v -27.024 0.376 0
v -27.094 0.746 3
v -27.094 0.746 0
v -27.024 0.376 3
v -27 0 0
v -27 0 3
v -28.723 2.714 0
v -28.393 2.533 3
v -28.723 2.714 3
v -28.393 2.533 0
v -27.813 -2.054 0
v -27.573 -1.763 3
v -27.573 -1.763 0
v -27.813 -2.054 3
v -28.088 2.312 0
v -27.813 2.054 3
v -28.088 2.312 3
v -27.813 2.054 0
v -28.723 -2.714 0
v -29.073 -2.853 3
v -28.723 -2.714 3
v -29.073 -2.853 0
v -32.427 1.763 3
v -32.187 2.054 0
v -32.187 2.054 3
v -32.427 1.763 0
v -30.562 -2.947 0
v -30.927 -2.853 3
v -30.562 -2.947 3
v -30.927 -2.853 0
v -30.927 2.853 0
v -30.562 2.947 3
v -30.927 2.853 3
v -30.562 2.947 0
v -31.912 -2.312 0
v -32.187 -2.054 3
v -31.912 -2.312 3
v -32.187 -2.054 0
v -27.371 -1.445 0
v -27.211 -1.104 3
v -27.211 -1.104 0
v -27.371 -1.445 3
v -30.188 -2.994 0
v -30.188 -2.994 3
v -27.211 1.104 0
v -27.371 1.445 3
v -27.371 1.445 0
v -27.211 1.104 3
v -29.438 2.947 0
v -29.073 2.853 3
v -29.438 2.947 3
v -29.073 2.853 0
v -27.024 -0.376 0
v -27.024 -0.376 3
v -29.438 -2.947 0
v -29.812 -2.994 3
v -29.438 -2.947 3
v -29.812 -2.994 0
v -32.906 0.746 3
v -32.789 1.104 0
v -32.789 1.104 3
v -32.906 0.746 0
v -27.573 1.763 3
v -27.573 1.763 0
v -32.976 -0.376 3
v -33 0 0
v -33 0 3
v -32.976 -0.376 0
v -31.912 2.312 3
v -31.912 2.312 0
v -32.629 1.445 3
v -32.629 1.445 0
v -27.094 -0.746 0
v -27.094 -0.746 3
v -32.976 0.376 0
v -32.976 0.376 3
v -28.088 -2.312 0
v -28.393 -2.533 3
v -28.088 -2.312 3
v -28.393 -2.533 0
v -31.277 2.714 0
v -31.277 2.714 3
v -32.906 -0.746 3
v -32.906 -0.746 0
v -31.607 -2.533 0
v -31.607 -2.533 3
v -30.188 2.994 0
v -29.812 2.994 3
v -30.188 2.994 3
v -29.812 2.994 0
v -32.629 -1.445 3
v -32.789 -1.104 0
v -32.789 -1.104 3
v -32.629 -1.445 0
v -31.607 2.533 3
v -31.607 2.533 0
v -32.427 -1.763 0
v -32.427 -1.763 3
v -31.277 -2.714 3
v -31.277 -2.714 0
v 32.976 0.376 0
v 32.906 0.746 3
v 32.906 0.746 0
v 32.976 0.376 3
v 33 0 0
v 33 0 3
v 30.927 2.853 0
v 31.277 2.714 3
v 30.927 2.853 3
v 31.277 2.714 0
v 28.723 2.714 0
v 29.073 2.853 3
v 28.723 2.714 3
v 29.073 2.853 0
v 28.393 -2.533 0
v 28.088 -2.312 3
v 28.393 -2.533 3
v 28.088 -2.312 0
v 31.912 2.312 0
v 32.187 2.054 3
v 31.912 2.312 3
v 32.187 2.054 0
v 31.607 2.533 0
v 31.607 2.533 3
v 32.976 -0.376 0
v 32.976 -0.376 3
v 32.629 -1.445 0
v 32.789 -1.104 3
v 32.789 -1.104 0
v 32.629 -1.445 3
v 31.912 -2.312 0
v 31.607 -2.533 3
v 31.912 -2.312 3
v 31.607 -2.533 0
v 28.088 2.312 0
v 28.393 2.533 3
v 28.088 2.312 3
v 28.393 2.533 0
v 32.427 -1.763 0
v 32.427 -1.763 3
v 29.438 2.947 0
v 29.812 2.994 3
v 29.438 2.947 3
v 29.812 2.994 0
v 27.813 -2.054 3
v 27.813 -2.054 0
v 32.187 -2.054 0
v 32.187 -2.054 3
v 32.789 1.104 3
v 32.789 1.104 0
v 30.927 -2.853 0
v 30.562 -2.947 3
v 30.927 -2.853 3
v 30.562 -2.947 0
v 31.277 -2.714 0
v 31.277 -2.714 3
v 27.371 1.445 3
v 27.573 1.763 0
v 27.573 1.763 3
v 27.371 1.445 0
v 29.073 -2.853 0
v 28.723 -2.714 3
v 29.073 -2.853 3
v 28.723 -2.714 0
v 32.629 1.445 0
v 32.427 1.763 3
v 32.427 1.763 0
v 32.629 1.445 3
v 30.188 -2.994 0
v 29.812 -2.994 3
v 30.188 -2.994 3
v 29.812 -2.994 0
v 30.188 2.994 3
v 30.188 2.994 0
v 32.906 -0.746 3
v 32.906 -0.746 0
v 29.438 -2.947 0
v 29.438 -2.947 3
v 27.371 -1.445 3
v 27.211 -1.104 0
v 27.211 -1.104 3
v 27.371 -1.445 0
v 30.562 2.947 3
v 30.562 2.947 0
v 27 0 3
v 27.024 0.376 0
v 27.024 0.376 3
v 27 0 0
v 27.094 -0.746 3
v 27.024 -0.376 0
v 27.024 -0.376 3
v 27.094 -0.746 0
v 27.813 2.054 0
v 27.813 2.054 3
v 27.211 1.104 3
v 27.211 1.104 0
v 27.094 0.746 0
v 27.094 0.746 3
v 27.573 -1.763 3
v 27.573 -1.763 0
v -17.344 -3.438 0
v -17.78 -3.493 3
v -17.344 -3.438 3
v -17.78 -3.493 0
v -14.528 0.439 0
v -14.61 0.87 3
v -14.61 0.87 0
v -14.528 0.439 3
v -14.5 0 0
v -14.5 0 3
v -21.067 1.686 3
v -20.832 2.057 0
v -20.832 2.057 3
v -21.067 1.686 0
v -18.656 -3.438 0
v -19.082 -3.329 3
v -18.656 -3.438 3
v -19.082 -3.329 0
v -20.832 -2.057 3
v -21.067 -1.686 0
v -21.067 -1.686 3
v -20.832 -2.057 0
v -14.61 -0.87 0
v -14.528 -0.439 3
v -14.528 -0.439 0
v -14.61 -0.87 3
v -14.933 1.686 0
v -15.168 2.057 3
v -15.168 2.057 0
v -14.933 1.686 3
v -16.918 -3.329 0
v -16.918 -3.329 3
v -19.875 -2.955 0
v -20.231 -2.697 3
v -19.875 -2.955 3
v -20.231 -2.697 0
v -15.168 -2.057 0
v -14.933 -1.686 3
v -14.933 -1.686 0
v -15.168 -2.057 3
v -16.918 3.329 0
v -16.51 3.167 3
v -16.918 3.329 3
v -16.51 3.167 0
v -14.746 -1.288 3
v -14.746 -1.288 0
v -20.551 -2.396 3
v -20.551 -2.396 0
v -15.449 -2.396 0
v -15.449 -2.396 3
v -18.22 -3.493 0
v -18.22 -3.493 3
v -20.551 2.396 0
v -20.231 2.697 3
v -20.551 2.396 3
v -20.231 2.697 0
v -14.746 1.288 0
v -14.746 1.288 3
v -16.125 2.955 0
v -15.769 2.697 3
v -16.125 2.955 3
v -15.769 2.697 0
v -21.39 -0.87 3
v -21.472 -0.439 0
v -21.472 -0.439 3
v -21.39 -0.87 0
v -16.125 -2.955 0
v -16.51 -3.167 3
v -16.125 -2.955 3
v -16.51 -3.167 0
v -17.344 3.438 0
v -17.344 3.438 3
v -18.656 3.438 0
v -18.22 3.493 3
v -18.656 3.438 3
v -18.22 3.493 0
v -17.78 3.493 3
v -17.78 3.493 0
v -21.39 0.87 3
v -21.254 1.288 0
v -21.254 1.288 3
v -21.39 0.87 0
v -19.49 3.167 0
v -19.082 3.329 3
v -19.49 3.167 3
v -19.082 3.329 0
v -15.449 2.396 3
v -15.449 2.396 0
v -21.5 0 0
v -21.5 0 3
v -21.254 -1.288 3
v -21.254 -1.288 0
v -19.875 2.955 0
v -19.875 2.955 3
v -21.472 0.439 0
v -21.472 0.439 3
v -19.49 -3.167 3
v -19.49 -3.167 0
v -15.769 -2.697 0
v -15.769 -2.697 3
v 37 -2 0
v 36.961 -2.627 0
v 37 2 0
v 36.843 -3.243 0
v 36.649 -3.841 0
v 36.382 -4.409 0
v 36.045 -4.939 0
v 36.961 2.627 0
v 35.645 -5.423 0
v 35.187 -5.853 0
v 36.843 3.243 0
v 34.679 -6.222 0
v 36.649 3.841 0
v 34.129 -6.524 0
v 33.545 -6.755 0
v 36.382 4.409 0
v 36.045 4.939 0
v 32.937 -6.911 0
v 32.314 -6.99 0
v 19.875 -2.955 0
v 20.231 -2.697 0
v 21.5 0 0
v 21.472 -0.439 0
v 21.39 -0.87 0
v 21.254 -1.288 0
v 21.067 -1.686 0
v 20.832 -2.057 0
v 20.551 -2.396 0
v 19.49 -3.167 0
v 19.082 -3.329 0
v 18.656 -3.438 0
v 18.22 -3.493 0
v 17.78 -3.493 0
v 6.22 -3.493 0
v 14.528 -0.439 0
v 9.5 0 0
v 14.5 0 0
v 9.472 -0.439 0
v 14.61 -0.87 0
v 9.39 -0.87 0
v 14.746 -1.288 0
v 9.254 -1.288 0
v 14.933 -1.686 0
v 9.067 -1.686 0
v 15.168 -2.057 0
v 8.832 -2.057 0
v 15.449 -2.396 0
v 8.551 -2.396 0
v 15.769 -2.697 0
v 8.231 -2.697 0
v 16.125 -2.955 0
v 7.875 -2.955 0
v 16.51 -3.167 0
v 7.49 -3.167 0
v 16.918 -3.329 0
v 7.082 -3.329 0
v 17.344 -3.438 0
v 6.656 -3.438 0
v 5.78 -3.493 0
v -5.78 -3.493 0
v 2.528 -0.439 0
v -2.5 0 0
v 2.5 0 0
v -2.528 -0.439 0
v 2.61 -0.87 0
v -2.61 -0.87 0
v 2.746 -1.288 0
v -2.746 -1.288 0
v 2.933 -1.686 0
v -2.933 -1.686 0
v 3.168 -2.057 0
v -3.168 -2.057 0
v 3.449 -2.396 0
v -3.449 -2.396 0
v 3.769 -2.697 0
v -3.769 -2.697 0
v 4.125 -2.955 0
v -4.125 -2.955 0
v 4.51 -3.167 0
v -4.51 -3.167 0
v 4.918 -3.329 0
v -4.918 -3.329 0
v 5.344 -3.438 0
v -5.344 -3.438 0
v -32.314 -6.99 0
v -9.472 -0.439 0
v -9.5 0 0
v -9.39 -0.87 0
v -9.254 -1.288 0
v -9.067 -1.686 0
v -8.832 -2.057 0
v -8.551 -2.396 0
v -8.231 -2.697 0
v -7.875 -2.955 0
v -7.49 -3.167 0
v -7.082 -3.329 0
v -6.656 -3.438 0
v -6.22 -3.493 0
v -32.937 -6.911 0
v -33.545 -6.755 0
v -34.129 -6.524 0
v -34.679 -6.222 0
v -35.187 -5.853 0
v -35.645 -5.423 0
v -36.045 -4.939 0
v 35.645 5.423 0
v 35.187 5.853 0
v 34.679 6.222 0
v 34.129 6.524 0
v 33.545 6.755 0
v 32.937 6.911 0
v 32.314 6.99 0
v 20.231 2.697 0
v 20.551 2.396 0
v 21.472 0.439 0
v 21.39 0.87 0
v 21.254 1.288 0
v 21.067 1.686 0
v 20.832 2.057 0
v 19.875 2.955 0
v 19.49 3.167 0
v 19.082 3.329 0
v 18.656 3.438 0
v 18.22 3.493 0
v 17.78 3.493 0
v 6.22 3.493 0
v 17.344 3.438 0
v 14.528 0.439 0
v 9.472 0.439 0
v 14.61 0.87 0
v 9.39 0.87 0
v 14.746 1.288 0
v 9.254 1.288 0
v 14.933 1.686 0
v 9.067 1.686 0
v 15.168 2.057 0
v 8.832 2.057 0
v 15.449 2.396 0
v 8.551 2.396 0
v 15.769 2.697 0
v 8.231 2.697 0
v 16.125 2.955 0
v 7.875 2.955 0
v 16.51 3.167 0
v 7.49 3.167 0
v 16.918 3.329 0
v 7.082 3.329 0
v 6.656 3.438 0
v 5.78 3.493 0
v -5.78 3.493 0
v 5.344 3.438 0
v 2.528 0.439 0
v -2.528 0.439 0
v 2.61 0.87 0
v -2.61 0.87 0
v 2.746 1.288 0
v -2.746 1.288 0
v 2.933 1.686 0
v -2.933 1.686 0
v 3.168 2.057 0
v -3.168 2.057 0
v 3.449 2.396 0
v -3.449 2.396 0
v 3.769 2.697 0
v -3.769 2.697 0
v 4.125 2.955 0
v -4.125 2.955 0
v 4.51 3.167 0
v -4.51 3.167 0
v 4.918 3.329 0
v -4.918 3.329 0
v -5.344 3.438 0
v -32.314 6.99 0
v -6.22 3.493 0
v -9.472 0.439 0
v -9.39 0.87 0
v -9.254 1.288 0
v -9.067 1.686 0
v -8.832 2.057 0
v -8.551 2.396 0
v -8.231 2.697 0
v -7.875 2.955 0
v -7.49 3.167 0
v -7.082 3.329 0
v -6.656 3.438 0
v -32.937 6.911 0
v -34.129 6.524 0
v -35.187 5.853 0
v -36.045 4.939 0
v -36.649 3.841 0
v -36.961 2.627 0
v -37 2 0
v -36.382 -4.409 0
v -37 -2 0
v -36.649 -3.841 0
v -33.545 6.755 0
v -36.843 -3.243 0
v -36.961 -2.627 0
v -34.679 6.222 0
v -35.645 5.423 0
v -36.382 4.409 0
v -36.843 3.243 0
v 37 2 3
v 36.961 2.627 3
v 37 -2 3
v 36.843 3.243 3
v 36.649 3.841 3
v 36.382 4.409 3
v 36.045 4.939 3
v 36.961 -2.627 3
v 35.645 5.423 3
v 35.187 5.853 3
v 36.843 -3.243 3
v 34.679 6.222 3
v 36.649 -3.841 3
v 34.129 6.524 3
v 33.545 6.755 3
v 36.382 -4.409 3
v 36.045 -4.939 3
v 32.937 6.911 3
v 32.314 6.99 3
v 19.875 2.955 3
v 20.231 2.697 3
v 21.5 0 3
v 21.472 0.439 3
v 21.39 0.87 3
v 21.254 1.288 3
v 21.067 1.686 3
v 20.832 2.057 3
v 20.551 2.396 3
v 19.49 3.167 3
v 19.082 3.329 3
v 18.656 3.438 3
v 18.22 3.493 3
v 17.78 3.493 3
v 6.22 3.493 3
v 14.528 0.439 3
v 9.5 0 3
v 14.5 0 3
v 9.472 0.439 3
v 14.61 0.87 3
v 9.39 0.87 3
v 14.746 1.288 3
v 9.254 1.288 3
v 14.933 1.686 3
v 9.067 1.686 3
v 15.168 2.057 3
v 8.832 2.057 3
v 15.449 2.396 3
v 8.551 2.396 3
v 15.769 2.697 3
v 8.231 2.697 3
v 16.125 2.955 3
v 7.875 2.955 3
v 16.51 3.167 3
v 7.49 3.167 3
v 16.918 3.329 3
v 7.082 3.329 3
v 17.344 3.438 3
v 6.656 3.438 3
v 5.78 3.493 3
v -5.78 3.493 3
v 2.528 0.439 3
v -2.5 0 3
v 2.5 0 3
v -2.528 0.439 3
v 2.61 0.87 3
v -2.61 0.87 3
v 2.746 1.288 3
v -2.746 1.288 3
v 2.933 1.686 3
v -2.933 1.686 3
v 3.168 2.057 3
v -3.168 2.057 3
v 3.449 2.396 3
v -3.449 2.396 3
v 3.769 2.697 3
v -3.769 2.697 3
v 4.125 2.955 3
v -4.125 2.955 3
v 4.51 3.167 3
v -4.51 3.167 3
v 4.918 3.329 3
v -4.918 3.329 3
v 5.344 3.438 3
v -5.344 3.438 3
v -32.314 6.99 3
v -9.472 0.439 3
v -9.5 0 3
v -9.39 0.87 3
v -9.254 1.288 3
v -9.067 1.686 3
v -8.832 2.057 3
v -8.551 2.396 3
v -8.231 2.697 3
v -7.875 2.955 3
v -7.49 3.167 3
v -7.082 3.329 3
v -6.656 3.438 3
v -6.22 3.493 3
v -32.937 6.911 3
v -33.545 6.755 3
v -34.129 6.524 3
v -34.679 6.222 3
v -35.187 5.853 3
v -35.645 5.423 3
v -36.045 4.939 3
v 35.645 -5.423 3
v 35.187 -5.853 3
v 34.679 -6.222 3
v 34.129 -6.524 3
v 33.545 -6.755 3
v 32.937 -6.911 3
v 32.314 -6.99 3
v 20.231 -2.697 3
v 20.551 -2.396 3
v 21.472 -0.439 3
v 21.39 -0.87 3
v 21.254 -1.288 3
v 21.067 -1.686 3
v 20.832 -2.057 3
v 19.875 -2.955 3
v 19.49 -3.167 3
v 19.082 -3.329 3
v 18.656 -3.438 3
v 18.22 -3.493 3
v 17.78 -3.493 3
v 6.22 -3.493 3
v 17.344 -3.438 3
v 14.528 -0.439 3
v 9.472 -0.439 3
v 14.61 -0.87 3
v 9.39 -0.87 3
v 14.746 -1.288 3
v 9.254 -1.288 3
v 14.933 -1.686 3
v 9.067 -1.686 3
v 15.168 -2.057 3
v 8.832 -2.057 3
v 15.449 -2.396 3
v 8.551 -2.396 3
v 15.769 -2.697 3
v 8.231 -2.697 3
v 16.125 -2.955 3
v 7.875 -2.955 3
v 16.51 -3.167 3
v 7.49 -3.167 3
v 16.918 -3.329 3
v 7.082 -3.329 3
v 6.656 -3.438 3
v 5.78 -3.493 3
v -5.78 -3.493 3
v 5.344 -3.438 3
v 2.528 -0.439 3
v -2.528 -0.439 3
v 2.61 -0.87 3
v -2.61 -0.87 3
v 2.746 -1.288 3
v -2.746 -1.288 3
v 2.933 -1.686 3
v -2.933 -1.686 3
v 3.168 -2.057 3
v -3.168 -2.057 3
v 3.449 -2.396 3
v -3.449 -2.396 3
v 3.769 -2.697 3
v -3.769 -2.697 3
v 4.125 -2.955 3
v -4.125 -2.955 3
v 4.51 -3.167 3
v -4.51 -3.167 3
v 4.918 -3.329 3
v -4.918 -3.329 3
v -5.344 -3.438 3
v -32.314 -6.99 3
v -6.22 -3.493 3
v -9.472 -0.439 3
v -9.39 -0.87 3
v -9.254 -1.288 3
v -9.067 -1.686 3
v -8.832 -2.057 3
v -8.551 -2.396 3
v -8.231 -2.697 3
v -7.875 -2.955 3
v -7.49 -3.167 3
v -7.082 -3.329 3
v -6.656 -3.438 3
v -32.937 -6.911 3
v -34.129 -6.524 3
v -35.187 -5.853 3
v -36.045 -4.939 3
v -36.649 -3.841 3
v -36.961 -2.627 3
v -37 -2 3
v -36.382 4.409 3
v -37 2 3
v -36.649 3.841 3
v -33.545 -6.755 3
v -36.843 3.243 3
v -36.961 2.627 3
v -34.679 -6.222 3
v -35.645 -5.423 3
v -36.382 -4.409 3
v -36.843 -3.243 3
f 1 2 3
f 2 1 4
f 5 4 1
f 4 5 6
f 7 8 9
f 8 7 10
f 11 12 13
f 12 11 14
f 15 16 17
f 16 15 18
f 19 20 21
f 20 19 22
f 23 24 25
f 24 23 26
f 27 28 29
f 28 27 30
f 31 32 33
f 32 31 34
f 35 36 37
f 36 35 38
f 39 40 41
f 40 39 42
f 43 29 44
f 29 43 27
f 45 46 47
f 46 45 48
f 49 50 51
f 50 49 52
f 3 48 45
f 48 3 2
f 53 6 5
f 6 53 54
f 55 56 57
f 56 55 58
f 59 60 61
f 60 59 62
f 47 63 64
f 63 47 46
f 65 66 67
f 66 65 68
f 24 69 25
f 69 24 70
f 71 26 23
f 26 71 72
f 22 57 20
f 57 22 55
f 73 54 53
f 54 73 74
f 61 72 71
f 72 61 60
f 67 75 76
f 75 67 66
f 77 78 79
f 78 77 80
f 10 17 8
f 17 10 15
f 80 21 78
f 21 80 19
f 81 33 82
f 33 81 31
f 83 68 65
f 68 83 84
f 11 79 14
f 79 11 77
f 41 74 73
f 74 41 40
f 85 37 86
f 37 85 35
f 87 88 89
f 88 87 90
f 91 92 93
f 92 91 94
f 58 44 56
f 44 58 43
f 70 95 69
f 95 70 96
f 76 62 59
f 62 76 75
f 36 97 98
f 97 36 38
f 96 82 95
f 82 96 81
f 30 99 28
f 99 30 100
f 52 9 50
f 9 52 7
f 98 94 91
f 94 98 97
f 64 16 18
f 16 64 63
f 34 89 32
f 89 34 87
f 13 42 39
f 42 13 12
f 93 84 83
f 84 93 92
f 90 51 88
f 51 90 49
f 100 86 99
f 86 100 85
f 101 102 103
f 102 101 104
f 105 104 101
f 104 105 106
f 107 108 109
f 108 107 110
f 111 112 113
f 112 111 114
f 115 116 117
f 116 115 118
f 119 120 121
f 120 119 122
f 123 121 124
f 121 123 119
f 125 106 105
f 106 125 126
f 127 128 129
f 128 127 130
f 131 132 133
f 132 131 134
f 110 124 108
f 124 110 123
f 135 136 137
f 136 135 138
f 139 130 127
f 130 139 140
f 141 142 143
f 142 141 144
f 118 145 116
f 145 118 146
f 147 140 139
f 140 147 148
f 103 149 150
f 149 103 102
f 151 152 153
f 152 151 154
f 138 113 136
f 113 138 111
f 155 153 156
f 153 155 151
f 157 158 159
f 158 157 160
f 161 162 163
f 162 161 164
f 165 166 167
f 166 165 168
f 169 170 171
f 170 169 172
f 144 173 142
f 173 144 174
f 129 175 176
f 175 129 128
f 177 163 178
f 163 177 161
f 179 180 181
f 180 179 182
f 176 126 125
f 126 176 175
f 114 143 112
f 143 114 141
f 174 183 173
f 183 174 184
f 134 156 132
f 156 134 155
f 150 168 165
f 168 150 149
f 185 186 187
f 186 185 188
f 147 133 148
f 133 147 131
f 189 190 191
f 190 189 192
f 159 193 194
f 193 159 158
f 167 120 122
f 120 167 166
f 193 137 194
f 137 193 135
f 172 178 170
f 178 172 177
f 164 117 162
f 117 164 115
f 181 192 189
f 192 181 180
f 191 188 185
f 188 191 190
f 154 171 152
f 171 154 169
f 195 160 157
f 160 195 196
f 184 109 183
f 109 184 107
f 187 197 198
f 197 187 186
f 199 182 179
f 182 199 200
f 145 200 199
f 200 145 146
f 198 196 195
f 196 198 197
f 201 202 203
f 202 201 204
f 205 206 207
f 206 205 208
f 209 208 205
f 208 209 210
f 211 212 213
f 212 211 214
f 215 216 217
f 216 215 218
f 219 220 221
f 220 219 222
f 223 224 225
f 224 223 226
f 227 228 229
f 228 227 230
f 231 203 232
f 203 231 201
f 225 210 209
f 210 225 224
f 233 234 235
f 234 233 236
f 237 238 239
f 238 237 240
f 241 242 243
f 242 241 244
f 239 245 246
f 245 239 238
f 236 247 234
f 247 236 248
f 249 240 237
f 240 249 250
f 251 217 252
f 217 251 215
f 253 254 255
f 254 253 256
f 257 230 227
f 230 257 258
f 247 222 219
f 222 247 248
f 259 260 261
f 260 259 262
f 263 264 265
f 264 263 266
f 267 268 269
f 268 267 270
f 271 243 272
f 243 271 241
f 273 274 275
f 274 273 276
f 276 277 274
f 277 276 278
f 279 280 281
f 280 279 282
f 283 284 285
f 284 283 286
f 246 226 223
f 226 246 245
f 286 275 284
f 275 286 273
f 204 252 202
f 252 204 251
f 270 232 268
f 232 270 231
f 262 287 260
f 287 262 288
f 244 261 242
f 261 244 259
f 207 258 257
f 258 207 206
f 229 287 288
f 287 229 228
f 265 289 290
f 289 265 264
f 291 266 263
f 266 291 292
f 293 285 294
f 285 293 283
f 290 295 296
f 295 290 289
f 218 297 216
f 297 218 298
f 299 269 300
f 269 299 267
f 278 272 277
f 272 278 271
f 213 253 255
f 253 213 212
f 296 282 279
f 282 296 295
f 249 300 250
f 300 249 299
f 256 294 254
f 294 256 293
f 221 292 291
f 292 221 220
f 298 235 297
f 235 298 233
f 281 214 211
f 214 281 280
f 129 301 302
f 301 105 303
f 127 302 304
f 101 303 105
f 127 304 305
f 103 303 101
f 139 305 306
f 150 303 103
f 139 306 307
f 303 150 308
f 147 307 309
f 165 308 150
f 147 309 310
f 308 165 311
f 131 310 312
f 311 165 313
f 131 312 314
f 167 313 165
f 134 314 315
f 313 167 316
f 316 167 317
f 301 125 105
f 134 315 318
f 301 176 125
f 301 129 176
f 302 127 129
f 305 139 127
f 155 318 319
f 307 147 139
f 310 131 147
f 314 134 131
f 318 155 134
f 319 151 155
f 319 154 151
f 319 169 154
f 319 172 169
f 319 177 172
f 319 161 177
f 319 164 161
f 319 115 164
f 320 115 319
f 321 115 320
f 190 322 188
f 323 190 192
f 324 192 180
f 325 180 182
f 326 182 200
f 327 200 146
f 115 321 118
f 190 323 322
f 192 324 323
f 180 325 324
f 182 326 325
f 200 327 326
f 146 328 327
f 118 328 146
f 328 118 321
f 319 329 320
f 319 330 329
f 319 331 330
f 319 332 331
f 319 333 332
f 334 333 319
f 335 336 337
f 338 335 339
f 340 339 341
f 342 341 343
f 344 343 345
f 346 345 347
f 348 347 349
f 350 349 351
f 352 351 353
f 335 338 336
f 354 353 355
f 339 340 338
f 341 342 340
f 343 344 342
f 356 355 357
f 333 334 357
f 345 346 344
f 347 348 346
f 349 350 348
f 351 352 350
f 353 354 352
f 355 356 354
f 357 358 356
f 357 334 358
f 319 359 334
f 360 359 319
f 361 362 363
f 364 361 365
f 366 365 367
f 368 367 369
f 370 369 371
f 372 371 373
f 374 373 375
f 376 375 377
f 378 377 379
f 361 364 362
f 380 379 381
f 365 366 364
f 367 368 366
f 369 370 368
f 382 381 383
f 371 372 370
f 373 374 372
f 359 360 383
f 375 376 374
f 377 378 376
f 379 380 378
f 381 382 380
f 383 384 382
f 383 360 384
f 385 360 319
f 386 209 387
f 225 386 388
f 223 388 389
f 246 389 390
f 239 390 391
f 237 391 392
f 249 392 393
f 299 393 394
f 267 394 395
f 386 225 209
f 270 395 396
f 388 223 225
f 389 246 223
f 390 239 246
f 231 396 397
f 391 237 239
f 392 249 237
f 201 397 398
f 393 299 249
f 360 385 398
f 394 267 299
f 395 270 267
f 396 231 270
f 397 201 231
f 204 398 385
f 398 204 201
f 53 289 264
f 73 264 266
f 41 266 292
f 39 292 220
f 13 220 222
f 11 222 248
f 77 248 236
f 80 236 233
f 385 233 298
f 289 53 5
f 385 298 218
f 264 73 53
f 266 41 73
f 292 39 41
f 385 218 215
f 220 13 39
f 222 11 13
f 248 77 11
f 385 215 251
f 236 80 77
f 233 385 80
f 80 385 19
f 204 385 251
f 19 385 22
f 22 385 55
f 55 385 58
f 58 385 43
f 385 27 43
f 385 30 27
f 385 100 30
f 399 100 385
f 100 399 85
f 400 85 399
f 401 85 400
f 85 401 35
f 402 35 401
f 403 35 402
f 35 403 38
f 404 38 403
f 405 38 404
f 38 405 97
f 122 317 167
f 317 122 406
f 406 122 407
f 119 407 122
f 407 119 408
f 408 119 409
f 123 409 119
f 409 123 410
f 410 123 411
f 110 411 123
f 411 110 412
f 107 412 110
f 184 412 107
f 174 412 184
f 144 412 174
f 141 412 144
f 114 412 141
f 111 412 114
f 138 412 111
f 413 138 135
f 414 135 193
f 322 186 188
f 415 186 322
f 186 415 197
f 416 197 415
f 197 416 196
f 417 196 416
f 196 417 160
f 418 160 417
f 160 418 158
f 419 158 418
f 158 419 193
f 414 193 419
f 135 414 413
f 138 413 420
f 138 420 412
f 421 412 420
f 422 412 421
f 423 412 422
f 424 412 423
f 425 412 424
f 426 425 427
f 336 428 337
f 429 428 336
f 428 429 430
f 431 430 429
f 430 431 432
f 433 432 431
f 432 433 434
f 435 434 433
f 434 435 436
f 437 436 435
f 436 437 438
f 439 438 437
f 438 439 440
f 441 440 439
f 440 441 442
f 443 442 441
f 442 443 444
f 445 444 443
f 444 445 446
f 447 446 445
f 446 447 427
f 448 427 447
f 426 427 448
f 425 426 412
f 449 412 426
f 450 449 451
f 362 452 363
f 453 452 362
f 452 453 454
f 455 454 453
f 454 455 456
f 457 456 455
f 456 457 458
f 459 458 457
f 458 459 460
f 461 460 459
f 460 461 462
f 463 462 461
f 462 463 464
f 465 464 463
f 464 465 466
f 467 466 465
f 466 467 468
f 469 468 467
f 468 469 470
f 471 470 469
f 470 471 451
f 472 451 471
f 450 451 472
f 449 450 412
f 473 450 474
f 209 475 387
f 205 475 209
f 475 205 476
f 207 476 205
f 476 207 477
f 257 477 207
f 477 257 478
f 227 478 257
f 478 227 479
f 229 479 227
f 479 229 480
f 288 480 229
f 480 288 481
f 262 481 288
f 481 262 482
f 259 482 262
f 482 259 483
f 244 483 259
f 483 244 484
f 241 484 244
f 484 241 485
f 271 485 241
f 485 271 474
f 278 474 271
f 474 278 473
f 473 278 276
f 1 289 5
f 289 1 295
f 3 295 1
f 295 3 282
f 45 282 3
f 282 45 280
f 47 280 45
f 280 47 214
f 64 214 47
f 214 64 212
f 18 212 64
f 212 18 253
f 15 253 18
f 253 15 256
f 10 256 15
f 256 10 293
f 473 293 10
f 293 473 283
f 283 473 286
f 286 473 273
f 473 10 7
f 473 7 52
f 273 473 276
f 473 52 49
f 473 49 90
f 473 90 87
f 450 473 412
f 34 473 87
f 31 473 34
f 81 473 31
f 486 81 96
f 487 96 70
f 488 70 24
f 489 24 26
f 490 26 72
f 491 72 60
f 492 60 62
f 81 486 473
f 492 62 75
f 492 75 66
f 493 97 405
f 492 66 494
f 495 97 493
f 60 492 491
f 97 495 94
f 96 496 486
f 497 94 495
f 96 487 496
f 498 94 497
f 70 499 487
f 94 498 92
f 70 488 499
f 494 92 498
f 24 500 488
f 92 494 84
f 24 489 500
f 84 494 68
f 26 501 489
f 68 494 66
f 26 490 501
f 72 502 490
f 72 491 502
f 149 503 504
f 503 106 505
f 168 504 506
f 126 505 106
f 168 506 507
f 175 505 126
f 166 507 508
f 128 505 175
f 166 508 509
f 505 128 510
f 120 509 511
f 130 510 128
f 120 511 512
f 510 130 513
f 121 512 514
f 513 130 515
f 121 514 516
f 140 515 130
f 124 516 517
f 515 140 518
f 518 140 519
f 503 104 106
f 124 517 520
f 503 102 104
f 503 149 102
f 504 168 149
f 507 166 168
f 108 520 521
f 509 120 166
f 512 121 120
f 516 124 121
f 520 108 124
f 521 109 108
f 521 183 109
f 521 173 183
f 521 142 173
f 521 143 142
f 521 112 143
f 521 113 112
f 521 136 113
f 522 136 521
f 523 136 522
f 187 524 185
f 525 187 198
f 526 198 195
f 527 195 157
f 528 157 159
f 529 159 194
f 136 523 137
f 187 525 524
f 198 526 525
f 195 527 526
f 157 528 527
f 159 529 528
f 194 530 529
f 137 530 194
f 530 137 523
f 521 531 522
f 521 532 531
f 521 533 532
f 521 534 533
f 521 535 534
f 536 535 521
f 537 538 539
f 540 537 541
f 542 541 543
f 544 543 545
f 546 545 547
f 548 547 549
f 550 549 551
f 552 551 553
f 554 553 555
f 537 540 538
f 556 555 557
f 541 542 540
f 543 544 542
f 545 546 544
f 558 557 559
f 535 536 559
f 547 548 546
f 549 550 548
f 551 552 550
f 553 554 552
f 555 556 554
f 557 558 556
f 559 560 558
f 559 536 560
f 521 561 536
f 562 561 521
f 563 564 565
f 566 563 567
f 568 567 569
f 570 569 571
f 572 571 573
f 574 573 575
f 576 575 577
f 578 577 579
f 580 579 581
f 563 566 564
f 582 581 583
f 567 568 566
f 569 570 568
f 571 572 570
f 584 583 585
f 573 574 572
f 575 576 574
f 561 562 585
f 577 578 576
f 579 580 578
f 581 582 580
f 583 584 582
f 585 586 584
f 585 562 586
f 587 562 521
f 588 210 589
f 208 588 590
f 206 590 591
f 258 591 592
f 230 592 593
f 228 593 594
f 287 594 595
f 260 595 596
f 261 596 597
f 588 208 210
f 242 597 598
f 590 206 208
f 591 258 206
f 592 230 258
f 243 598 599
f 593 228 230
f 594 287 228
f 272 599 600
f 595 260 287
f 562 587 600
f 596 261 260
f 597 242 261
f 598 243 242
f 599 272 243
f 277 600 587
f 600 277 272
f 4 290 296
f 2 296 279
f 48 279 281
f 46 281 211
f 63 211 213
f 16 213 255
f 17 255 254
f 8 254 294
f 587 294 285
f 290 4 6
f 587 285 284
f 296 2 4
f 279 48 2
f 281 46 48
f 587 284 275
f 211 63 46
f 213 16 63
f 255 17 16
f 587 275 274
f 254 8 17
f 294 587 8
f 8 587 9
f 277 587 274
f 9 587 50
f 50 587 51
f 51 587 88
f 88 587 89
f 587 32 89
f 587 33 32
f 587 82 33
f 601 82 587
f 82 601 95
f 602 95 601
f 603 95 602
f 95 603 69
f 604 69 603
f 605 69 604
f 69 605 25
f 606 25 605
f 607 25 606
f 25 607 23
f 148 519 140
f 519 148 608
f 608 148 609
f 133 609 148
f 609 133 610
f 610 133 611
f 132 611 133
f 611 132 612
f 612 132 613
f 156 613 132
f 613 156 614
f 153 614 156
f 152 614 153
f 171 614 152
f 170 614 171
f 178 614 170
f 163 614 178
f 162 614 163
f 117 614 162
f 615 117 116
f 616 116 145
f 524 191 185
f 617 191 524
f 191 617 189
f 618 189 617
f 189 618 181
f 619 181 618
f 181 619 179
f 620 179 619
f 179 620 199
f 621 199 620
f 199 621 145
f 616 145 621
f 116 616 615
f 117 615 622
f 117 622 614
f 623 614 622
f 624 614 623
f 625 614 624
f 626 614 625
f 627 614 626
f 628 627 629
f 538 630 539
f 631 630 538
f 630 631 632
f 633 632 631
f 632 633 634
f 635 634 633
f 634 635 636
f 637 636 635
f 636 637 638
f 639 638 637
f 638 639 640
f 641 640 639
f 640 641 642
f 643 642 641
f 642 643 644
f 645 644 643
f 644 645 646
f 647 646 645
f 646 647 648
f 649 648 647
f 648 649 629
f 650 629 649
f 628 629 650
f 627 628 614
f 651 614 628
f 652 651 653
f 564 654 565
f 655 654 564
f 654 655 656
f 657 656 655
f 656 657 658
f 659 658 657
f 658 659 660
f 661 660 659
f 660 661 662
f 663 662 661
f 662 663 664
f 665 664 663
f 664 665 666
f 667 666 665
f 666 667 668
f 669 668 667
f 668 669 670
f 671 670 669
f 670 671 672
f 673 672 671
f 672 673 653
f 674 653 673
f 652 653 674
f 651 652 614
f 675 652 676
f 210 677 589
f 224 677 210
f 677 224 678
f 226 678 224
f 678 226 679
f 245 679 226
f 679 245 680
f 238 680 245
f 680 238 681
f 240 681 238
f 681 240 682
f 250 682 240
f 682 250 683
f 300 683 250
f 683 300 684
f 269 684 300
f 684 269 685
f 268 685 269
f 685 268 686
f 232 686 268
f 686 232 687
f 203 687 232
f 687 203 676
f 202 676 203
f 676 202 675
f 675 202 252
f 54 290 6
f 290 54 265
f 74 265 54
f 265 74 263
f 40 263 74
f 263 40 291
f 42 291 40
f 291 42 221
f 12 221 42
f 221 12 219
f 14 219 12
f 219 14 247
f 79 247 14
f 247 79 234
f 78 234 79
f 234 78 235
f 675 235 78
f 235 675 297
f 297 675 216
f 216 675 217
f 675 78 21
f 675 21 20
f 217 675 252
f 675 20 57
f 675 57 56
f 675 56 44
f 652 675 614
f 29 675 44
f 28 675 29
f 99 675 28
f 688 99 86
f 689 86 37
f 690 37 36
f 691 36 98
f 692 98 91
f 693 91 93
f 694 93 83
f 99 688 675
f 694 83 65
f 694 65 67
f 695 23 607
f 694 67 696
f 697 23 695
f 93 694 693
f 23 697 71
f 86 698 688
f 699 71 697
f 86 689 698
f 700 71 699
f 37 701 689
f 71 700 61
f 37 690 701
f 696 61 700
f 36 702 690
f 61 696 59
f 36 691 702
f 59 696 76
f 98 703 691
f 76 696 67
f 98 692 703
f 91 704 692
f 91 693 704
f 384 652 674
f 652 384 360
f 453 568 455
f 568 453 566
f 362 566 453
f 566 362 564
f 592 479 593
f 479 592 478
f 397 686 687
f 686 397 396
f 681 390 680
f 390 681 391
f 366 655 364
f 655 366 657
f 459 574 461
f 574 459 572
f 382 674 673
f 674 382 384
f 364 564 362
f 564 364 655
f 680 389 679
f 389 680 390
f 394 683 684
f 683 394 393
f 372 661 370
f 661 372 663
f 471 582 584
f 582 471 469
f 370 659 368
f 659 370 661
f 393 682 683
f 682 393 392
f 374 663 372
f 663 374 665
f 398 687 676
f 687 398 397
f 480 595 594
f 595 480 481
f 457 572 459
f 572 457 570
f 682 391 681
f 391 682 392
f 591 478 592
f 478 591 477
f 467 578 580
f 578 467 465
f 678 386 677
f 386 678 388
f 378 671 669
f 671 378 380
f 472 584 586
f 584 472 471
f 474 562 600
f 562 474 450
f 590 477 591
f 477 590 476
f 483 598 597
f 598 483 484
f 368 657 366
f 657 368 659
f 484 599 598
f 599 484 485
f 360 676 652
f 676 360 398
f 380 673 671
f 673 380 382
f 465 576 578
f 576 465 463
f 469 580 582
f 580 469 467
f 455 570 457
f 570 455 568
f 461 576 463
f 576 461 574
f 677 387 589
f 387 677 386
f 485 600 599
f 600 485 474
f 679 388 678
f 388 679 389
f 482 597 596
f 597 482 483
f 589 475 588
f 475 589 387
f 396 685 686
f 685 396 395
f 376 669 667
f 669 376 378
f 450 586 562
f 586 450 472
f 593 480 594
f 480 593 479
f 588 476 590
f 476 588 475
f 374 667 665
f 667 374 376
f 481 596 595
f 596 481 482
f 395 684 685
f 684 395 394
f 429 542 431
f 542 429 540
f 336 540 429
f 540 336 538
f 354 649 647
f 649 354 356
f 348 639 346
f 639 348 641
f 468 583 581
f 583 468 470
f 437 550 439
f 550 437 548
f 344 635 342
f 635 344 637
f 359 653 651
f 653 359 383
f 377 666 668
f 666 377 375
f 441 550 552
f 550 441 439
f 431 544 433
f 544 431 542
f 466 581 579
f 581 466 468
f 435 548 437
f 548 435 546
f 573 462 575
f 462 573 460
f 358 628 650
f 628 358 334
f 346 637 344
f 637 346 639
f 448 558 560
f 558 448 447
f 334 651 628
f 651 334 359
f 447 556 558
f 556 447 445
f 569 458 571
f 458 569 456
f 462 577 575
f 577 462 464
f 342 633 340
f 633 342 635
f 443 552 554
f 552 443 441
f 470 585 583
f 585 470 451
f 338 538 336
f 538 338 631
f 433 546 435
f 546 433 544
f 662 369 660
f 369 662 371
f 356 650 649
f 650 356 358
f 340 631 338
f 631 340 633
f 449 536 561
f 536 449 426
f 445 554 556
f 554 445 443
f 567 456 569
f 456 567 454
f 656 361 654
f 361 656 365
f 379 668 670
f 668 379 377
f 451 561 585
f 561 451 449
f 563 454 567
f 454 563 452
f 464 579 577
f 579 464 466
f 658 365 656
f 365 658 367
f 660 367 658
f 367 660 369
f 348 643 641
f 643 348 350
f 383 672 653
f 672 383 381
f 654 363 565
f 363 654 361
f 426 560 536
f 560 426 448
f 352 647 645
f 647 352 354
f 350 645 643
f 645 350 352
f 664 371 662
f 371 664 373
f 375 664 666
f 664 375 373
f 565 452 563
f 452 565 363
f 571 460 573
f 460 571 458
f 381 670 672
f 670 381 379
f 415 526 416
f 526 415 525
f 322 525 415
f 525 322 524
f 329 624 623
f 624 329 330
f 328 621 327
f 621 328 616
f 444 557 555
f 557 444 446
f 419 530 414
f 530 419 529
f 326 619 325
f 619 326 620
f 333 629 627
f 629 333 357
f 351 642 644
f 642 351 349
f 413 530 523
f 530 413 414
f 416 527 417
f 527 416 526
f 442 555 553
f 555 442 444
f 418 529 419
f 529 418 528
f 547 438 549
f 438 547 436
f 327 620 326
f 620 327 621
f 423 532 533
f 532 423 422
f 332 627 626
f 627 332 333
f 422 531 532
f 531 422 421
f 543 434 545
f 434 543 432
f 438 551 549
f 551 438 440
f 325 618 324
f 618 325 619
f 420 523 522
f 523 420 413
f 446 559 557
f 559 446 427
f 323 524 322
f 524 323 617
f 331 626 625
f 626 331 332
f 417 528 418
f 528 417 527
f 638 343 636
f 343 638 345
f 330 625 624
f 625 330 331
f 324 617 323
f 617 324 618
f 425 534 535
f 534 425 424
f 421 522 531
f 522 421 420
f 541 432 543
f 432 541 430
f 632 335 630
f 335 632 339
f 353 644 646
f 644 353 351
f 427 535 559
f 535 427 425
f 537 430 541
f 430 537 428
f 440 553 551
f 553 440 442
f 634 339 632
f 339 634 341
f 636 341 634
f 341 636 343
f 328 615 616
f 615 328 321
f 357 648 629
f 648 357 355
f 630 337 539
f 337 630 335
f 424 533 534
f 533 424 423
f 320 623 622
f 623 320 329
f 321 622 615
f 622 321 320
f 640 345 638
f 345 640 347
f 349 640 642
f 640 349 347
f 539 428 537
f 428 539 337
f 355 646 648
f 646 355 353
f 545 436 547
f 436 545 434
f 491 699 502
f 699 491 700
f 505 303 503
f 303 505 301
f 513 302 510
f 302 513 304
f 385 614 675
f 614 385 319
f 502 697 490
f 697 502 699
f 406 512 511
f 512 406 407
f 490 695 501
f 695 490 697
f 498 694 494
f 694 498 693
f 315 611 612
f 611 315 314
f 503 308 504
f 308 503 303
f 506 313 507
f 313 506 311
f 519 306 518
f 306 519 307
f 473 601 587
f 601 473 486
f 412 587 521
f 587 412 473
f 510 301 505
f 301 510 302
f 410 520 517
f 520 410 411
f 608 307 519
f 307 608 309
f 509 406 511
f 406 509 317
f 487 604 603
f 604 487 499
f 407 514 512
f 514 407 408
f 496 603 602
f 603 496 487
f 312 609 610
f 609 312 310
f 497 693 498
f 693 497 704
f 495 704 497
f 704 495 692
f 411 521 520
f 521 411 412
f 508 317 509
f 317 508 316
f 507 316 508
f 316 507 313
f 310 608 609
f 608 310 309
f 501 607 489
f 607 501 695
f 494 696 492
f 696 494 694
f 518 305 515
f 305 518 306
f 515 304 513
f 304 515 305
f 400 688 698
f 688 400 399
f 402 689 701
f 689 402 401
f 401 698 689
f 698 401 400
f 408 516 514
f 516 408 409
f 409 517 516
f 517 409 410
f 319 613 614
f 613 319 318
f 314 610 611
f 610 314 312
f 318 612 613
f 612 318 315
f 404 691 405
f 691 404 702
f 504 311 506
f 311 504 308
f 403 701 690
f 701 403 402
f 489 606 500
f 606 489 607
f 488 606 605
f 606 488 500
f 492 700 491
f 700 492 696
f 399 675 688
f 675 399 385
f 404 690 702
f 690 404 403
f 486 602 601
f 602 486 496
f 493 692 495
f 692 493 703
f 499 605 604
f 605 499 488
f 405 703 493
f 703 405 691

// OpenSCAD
$fn = 50;


difference() {
	union() {
		hull() {
			translate(v = [-32.0000000000, 2.0000000000, 0]) {
				cylinder(h = 3, r = 5);
			}
			translate(v = [32.0000000000, 2.0000000000, 0]) {
				cylinder(h = 3, r = 5);
			}
			translate(v = [-32.0000000000, -2.0000000000, 0]) {
				cylinder(h = 3, r = 5);
			}
			translate(v = [32.0000000000, -2.0000000000, 0]) {
				cylinder(h = 3, r = 5);
			}
		}
	}
	union() {
		#translate(v = [-30.0000000000, 0.0000000000, 0]) {
			cylinder(h = 3, r = 3.0000000000);
		}
		#translate(v = [30.0000000000, 0.0000000000, 0]) {
			cylinder(h = 3, r = 3.0000000000);
		}
		#translate(v = [-30.0000000000, 0.0000000000, -100.0000000000]) {
			cylinder(h = 200, r = 3.0000000000);
		}
		#translate(v = [-30.0000000000, 0.0000000000, -100.0000000000]) {
			cylinder(h = 200, r = 3.0000000000);
		}
		#translate(v = [30.0000000000, 0.0000000000, -100.0000000000]) {
			cylinder(h = 200, r = 3.0000000000);
		}
		#translate(v = [30.0000000000, 0.0000000000, -100.0000000000]) {
			cylinder(h = 200, r = 3.0000000000);
		}
		#translate(v = [-30.0000000000, 0.0000000000, 0]) {
			cylinder(h = 3, r = 1.5000000000);
		}
		#translate(v = [30.0000000000, 0.0000000000, 0]) {
			cylinder(h = 3, r = 1.5000000000);
		}
		#translate(v = [-30.0000000000, 0.0000000000, 0]) {
			cylinder(h = 3, r = 1.5000000000);
		}
		#translate(v = [30.0000000000, 0.0000000000, 0]) {
			cylinder(h = 3, r = 1.5000000000);
		}
		#translate(v = [-30.0000000000, 0.0000000000, 0]) {
			cylinder(h = 3, r = 1.5000000000);
		}
		#translate(v = [30.0000000000, 0.0000000000, 0]) {
			cylinder(h = 3, r = 1.5000000000);
		}
		#translate(v = [-18.0000000000, 0, 0]) {
			cylinder(h = 3, r = 3.5000000000);
		}
		#translate(v = [-6.0000000000, 0, 0]) {
			cylinder(h = 3, r = 3.5000000000);
		}
		#translate(v = [6.0000000000, 0, 0]) {
			cylinder(h = 3, r = 3.5000000000);
		}
		#translate(v = [18.0000000000, 0, 0]) {
			cylinder(h = 3, r = 3.5000000000);
		}
	}
}
